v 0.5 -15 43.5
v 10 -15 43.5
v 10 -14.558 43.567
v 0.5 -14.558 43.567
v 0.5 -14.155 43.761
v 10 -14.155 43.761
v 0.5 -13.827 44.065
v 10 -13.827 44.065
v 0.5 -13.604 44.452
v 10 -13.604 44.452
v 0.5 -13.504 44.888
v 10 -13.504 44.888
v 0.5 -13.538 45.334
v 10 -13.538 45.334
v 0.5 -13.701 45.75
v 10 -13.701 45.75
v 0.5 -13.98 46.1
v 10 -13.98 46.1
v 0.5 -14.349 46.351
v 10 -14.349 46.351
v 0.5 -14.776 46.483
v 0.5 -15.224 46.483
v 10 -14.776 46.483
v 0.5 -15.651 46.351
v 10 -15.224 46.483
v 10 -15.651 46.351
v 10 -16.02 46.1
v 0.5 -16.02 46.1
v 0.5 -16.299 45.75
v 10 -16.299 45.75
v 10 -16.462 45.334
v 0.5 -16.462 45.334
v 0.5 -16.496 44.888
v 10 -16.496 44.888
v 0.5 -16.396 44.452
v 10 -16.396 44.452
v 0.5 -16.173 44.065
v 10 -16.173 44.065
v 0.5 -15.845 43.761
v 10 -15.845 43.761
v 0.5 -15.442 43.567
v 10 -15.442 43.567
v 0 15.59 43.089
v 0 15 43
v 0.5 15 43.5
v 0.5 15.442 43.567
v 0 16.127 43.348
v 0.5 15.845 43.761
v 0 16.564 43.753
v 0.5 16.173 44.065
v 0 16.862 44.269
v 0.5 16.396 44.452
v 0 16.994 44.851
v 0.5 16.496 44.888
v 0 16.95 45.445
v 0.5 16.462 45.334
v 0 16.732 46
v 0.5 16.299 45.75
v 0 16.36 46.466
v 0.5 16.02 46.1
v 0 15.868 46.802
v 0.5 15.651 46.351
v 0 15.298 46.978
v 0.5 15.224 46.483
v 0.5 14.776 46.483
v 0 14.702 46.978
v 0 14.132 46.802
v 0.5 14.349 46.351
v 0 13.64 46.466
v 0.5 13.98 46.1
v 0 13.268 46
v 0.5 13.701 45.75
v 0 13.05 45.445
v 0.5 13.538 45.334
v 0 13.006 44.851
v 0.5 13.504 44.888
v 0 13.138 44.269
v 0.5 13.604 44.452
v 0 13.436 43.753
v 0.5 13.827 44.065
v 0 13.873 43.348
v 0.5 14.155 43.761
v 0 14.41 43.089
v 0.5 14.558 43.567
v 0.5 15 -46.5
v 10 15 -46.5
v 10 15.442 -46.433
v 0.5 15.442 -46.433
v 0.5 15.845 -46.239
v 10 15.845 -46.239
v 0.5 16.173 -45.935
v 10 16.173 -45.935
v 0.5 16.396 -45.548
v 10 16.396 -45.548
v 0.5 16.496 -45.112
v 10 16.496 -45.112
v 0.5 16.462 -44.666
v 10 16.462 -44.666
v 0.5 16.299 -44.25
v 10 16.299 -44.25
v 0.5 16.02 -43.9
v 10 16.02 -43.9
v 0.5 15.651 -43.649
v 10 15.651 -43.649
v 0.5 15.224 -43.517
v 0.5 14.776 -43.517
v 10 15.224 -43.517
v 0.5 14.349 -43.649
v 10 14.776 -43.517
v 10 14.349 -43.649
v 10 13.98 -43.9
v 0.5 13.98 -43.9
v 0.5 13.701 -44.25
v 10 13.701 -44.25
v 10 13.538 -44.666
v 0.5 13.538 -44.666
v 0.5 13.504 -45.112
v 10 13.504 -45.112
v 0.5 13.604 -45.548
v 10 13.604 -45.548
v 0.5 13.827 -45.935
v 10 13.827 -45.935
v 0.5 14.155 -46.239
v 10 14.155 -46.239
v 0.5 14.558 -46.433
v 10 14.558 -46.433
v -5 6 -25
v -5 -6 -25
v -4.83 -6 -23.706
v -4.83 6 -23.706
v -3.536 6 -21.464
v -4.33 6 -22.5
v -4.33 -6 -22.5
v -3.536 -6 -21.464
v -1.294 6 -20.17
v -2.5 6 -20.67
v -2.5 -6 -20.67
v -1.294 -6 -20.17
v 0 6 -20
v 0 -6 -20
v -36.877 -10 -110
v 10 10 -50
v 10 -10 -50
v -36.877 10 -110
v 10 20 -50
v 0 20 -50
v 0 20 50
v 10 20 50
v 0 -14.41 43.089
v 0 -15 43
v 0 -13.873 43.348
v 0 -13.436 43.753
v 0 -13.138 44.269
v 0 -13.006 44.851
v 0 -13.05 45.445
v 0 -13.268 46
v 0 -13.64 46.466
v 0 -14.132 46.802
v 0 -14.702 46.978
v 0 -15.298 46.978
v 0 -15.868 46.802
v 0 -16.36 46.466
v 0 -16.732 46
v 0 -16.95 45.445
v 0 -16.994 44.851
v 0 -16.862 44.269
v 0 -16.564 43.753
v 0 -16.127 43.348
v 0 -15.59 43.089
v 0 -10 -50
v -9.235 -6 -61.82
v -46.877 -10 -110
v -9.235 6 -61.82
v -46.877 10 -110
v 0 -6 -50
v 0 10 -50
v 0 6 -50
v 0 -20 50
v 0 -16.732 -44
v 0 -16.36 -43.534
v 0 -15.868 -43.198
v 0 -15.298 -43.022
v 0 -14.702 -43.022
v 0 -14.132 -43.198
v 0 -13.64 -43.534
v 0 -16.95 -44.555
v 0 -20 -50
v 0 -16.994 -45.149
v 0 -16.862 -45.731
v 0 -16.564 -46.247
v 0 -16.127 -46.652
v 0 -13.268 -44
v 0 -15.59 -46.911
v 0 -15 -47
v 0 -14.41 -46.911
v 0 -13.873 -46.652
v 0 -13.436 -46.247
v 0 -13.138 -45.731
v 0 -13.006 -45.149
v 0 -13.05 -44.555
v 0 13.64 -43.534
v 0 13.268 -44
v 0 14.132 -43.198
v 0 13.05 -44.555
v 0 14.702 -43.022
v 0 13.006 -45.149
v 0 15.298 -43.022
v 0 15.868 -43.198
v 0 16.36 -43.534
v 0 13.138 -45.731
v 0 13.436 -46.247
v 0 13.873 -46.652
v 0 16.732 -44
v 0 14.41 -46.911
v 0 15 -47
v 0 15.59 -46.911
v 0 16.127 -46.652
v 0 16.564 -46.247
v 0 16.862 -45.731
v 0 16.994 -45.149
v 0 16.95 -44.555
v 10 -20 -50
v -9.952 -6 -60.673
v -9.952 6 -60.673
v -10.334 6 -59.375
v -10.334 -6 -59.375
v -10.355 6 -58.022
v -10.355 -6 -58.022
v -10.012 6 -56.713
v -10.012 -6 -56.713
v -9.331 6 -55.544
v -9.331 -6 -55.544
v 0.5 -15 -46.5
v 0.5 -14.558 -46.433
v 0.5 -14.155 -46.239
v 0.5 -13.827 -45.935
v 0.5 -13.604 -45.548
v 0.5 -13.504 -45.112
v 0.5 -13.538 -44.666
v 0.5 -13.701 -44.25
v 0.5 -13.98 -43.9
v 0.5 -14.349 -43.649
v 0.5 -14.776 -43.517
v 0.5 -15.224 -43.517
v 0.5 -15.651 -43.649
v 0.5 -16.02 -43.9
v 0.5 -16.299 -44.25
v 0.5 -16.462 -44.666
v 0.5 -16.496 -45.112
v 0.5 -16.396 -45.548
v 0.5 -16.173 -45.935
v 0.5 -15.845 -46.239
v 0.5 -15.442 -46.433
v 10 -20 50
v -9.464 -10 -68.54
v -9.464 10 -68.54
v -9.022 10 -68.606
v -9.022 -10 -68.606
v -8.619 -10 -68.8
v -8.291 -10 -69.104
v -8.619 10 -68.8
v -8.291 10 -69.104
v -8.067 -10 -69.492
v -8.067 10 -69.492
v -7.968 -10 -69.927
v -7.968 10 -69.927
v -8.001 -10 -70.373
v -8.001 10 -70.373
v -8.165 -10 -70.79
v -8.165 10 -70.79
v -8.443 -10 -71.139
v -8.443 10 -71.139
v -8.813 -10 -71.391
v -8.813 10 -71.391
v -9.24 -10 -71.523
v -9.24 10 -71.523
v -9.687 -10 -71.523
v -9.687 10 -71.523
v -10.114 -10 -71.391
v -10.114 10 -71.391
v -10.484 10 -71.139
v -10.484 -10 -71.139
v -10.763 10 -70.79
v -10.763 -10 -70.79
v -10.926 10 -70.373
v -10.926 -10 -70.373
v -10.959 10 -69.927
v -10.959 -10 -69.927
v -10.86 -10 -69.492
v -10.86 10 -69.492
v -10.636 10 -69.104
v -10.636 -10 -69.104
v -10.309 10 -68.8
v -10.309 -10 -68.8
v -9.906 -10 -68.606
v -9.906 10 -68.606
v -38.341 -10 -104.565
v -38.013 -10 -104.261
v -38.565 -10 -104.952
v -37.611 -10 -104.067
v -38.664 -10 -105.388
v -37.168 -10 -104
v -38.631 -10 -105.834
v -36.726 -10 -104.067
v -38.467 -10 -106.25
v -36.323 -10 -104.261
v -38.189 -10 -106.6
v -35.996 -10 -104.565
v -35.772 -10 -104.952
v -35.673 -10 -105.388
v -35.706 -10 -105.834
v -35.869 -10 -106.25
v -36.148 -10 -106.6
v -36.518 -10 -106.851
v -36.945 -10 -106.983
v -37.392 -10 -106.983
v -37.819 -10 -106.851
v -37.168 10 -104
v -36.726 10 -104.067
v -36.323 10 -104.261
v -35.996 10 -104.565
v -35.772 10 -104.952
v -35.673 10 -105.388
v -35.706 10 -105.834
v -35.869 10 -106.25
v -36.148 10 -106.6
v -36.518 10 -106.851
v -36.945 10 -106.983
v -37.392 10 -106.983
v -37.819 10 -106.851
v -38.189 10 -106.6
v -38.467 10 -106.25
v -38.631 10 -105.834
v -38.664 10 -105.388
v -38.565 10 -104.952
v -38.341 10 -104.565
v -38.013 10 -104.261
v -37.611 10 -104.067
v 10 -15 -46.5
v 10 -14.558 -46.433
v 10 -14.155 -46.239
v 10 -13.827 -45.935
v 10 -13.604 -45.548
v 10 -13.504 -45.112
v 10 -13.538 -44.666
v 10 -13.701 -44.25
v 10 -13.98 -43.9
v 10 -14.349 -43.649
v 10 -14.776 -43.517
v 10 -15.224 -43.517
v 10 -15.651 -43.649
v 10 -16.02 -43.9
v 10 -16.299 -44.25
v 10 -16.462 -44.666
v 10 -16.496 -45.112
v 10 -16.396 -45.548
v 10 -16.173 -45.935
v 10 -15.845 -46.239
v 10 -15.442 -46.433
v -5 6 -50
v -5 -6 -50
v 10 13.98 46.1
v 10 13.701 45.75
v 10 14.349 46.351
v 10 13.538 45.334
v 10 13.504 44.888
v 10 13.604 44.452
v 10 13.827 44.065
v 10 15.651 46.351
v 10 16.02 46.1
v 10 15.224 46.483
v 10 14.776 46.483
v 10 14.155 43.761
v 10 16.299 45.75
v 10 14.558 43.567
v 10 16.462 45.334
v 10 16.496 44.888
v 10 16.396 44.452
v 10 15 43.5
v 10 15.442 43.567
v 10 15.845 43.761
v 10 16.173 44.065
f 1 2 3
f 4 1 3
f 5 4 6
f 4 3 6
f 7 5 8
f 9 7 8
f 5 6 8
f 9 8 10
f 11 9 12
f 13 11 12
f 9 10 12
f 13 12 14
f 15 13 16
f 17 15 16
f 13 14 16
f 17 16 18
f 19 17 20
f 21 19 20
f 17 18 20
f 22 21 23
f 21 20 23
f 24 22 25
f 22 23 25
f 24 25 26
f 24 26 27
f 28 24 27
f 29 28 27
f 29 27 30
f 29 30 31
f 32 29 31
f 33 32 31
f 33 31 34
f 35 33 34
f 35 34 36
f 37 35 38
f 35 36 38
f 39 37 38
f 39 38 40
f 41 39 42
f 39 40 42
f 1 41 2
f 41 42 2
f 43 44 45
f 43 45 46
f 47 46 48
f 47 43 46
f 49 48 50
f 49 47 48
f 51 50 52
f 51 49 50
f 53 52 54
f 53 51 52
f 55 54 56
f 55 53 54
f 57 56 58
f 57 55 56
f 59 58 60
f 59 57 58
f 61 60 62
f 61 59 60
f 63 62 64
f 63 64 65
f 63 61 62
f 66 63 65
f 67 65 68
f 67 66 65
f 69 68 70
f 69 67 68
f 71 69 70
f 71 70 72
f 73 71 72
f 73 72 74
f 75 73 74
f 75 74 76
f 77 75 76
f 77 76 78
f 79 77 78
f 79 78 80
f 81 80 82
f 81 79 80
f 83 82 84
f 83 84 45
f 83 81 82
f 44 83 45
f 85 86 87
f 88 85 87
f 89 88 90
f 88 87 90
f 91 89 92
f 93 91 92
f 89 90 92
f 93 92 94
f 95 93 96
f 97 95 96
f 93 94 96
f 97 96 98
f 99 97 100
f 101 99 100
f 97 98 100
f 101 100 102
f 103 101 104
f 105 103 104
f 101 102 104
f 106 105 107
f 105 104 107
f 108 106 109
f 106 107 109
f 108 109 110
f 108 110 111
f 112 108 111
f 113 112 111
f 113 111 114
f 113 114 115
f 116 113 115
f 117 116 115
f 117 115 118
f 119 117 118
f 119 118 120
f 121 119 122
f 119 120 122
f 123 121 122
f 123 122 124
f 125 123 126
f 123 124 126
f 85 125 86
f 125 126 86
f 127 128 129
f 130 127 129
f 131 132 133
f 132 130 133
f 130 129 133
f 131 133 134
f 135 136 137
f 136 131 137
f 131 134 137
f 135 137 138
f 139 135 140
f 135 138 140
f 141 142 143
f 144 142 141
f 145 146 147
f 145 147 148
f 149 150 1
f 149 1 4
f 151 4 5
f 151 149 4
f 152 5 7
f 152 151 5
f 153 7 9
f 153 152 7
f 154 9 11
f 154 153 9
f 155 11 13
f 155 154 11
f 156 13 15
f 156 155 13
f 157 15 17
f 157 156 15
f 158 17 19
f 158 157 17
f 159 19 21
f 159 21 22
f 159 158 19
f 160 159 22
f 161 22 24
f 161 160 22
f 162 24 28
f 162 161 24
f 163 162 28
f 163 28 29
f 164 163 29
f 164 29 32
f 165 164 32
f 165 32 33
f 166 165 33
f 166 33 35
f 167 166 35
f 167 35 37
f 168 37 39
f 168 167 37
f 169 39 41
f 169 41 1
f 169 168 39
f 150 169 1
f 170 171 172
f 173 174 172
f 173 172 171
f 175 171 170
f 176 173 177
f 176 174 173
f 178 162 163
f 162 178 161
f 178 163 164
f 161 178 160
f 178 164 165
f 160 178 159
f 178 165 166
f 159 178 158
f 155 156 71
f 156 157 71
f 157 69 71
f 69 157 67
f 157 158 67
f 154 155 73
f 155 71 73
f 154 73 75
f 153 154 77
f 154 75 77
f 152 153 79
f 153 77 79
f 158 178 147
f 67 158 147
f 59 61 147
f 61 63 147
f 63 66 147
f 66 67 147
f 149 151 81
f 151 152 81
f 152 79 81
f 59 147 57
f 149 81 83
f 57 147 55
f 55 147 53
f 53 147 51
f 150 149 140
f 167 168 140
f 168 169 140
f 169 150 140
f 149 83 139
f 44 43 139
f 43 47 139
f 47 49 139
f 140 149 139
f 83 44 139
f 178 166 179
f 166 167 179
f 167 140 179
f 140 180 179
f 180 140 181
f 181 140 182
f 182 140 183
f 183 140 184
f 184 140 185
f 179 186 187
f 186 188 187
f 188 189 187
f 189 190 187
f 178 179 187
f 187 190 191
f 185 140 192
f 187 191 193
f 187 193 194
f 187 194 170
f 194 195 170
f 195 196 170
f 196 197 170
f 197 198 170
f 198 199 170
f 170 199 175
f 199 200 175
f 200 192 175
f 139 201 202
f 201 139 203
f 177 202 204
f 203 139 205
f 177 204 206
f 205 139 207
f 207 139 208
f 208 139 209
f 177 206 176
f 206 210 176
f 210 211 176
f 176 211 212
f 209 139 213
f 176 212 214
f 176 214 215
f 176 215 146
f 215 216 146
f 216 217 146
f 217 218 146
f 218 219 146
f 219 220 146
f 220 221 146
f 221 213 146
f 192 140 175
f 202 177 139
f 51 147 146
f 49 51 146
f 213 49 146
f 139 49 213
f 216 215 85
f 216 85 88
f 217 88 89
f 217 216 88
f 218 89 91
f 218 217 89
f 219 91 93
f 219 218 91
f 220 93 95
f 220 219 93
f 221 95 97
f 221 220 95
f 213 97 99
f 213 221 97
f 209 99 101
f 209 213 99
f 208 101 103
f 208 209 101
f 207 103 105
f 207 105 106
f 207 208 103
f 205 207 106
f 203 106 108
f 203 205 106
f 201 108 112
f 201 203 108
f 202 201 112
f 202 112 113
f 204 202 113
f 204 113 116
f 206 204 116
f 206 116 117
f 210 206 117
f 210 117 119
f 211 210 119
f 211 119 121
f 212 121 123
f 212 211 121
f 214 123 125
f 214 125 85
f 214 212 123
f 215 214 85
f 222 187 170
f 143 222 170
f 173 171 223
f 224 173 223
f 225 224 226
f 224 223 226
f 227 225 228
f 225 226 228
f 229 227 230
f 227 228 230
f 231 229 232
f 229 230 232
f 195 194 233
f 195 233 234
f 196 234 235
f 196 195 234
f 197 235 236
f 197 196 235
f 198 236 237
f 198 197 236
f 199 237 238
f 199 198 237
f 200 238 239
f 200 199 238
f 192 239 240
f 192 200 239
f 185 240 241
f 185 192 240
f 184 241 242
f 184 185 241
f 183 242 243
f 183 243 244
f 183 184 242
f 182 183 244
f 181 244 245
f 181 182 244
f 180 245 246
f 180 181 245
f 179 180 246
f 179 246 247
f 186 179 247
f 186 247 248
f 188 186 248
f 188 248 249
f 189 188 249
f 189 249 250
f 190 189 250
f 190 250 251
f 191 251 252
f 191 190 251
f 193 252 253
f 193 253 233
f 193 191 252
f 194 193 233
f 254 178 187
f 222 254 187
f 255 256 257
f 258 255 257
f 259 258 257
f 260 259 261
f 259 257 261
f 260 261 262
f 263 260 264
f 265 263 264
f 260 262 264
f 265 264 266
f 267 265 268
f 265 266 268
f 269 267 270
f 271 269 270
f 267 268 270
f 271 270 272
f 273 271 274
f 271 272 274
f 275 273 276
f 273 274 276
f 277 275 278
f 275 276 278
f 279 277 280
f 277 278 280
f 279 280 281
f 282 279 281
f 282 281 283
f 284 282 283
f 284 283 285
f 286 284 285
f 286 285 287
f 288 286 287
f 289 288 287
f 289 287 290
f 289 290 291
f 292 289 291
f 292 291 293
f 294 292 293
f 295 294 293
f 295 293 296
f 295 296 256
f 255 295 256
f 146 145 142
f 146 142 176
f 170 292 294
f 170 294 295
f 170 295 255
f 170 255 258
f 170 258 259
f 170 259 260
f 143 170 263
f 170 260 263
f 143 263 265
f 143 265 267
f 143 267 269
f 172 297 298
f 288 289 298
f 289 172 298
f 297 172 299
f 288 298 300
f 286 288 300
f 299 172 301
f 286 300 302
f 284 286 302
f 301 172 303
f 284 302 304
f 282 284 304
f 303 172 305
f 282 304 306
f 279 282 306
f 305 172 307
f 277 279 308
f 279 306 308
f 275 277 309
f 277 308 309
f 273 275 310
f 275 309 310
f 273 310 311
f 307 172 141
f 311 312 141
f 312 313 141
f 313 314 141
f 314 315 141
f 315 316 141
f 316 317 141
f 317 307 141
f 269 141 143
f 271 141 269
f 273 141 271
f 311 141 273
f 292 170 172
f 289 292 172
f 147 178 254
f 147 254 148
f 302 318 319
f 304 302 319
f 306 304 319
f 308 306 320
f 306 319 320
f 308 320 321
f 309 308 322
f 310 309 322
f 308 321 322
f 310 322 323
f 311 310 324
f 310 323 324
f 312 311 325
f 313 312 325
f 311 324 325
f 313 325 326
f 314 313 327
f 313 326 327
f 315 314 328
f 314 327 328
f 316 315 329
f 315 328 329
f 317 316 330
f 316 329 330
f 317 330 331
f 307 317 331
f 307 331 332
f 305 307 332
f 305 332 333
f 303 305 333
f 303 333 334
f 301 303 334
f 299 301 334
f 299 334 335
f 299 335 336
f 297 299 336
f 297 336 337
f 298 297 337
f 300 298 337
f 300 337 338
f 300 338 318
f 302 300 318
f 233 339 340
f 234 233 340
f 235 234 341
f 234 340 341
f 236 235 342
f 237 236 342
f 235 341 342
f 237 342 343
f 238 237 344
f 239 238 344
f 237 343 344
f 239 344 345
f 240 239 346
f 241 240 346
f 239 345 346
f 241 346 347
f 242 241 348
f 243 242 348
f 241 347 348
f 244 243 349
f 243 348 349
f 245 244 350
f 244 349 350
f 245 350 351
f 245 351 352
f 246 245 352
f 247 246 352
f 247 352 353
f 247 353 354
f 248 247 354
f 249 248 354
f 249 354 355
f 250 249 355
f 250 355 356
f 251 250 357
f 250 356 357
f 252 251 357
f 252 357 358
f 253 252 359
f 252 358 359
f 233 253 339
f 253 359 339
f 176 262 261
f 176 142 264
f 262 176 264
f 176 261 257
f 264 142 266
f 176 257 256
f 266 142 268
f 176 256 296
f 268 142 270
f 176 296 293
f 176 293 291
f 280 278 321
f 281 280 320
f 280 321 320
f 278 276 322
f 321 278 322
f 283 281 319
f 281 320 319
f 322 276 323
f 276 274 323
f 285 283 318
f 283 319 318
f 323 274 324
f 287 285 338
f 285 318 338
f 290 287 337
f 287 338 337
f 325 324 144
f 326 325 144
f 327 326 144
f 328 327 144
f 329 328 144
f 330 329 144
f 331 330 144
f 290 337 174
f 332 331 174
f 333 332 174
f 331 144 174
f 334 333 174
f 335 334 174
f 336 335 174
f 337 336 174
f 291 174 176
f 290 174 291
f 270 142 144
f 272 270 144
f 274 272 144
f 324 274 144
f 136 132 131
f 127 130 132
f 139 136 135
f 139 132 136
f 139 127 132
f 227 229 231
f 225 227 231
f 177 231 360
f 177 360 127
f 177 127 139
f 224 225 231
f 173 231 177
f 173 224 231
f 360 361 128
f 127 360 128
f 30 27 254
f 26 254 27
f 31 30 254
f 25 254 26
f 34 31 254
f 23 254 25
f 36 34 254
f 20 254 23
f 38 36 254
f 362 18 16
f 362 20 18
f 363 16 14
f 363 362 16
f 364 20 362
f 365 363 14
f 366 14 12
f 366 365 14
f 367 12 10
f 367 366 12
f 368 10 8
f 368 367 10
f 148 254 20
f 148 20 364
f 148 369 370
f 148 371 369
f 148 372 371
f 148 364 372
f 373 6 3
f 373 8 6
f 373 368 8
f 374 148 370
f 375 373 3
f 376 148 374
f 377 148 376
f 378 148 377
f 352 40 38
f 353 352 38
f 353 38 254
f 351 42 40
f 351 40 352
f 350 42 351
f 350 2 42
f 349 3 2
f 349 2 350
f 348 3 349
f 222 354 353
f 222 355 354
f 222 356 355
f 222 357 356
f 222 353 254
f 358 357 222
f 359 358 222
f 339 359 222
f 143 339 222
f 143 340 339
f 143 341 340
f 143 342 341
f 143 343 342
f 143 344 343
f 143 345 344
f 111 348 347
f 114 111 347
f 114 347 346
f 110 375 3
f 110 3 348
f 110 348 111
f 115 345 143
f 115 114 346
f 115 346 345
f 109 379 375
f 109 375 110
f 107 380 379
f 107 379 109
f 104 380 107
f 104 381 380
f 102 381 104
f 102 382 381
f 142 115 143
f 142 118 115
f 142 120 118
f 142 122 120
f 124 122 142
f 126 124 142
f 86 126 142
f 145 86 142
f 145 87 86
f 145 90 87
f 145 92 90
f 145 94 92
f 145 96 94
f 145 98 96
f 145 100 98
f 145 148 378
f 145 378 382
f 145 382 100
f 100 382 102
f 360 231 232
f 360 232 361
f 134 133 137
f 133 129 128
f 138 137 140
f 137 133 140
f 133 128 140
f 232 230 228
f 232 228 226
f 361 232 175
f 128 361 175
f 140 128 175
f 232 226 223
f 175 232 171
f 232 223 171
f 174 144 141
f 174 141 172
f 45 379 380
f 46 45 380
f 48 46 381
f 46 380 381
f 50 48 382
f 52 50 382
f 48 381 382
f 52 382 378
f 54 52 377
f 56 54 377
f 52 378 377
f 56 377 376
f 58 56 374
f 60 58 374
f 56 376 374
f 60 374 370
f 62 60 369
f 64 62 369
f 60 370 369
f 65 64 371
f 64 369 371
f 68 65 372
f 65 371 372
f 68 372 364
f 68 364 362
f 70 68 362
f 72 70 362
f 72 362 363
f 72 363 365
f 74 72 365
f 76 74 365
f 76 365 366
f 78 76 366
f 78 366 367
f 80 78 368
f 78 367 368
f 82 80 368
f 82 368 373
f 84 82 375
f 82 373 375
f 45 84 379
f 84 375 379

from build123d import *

# Parameters (mm, degrees)
SKETCH_1_W           = 100
SKETCH_1_H           = 40
EXTRUDE_1_DEPTH      = 10
EXTRUDE_2_DEPTH      = 30
SKETCH_4_R           = 1.5
CUT_EXTRUDE_1_DEPTH  = 127.085153879
CUT_EXTRUDE_2_DEPTH  = 10
SKETCH_7_R           = 1.5
CUT_EXTRUDE_3_DEPTH  = 10
CHAMFER_2_SIZE       = 0.5
EXTRUDE_3_DEPTH      = 6
EXTRUDE_3_DEPTH_BACK = 6
FILLET_1_R           = 5


with BuildPart() as part:
    # 草图1 → 凸台-拉伸1 (new body)
    with BuildSketch(Plane(origin=(0, 0, 0), x_dir=(0, 0, -1), z_dir=(1, 0, 0))):
        Rectangle(SKETCH_1_W, SKETCH_1_H)
    extrude(amount=EXTRUDE_1_DEPTH)

    # 草图3 → 凸台-拉伸2 (add)
    with BuildSketch(Plane(origin=(0, 20, 0), x_dir=(1, 0, 0), z_dir=(0, 1, 0))):
        Polygon((10, 50), (-36.87713759, 110), (-46.87713759, 110), (0, 50), align=None)
    extrude(amount=-EXTRUDE_2_DEPTH)

    # 草图4 → 切除-拉伸1 (cut, through all)
    with BuildSketch(Plane(origin=(0, 20, 0), x_dir=(1, 0, 0), z_dir=(0, 1, 0))):
        with Locations(Location((-37.168406916, 105.5, 0), (0, 0, 270))):
            Circle(SKETCH_4_R)
        with Locations(Location((-9.463640527, 70.039516088, 0), (0, 0, 270))):
            Circle(SKETCH_4_R)
    extrude(amount=-CUT_EXTRUDE_1_DEPTH, mode=Mode.SUBTRACT)

    # 草图5 → 切除-拉伸2 (cut)
    with BuildSketch(Plane(origin=(0, 20, 0), x_dir=(1, 0, 0), z_dir=(0, 1, 0))):
        Polygon((10, 50), (0, 50), (-46.87713759, 110), (-36.87713759, 110), align=None)
    extrude(amount=-CUT_EXTRUDE_2_DEPTH, mode=Mode.SUBTRACT)

    # 草图7 → 切除-拉伸3 (cut)
    with BuildSketch(Plane(origin=(10, 0, 0), x_dir=(0, 0, -1), z_dir=(1, 0, 0))):
        with Locations((-45, 15)):
            Circle(SKETCH_7_R)
        with Locations((-45, -15)):
            Circle(SKETCH_7_R)
        with Locations((45, -15)):
            Circle(SKETCH_7_R)
        with Locations((45, 15)):
            Circle(SKETCH_7_R)
    extrude(amount=-CUT_EXTRUDE_3_DEPTH, mode=Mode.SUBTRACT)

    # 倒角2
    chamfer_2_edges = [part.edges().sort_by_distance(p)[0] for p in [
        (0, 15, -43.5),
        (0, -15, -43.5),
        (0, -15, 46.5),
        (0, 15, 46.5),
    ]]
    chamfer(chamfer_2_edges, length=CHAMFER_2_SIZE)

    # 草图9 → 凸台-拉伸3 (add, two sides: drawn at the far end of the back side and taken through both)
    with BuildSketch(Plane(origin=(0, 0, 0), x_dir=(1, 0, 0), z_dir=(0, 1, 0)).offset(-EXTRUDE_3_DEPTH_BACK)):
        Polygon((-9.23492213, 61.820161304), (-12.339726869, 59.394421988), (-5, 50), (-5, 20), (0, 20), (0, 50), align=None)
    extrude(amount=EXTRUDE_3_DEPTH + EXTRUDE_3_DEPTH_BACK)

    # 圆角1
    # the kernel refuses this fillet: 5 mm, written as the material it takes off along each edge
    with BuildSketch(Plane(origin=(-5, -18.5, -20), x_dir=(1, 0, 0), z_dir=(0, 1, 0))) as fillet_1_piece_1:
        with BuildLine():
            CenterArc((FILLET_1_R, FILLET_1_R), FILLET_1_R, 180, 90)
            Line((0, FILLET_1_R), (-FILLET_1_R * 0.02, FILLET_1_R))
            Line((-FILLET_1_R * 0.02, FILLET_1_R), (-FILLET_1_R * 0.02, -FILLET_1_R * 0.02))
            Line((-FILLET_1_R * 0.02, -FILLET_1_R * 0.02), (FILLET_1_R, -FILLET_1_R * 0.02))
            Line((FILLET_1_R, -FILLET_1_R * 0.02), (FILLET_1_R, 0))
        make_face()
    extrude(amount=37, mode=Mode.SUBTRACT)
    with BuildSketch(Plane(origin=(-12.339726869, -18.215899984, -59.394421988), x_dir=(0.7880107536067237, 0, -0.6156614753256561), z_dir=(0, 1, 0))) as fillet_1_piece_2:
        with BuildLine():
            CenterArc((5, -4.886359993), FILLET_1_R, 102.23895269, 77.76104731)
            Line((0, -4.886359993), (-0.1, -4.886359993))
            Line((-0.1, -4.886359993), (-0.1, 0))
            Line((-0.1, 0), (0, 0.1))
            ThreePointArc((0, 0.1), (1.970026884, 0.1), (3.918854843, 0.0977272))
            Line((3.918854843, 0.0977272), (3.940053768, 0))
        make_face()
    extrude(amount=36.431799967, mode=Mode.SUBTRACT)


solid = part.part
